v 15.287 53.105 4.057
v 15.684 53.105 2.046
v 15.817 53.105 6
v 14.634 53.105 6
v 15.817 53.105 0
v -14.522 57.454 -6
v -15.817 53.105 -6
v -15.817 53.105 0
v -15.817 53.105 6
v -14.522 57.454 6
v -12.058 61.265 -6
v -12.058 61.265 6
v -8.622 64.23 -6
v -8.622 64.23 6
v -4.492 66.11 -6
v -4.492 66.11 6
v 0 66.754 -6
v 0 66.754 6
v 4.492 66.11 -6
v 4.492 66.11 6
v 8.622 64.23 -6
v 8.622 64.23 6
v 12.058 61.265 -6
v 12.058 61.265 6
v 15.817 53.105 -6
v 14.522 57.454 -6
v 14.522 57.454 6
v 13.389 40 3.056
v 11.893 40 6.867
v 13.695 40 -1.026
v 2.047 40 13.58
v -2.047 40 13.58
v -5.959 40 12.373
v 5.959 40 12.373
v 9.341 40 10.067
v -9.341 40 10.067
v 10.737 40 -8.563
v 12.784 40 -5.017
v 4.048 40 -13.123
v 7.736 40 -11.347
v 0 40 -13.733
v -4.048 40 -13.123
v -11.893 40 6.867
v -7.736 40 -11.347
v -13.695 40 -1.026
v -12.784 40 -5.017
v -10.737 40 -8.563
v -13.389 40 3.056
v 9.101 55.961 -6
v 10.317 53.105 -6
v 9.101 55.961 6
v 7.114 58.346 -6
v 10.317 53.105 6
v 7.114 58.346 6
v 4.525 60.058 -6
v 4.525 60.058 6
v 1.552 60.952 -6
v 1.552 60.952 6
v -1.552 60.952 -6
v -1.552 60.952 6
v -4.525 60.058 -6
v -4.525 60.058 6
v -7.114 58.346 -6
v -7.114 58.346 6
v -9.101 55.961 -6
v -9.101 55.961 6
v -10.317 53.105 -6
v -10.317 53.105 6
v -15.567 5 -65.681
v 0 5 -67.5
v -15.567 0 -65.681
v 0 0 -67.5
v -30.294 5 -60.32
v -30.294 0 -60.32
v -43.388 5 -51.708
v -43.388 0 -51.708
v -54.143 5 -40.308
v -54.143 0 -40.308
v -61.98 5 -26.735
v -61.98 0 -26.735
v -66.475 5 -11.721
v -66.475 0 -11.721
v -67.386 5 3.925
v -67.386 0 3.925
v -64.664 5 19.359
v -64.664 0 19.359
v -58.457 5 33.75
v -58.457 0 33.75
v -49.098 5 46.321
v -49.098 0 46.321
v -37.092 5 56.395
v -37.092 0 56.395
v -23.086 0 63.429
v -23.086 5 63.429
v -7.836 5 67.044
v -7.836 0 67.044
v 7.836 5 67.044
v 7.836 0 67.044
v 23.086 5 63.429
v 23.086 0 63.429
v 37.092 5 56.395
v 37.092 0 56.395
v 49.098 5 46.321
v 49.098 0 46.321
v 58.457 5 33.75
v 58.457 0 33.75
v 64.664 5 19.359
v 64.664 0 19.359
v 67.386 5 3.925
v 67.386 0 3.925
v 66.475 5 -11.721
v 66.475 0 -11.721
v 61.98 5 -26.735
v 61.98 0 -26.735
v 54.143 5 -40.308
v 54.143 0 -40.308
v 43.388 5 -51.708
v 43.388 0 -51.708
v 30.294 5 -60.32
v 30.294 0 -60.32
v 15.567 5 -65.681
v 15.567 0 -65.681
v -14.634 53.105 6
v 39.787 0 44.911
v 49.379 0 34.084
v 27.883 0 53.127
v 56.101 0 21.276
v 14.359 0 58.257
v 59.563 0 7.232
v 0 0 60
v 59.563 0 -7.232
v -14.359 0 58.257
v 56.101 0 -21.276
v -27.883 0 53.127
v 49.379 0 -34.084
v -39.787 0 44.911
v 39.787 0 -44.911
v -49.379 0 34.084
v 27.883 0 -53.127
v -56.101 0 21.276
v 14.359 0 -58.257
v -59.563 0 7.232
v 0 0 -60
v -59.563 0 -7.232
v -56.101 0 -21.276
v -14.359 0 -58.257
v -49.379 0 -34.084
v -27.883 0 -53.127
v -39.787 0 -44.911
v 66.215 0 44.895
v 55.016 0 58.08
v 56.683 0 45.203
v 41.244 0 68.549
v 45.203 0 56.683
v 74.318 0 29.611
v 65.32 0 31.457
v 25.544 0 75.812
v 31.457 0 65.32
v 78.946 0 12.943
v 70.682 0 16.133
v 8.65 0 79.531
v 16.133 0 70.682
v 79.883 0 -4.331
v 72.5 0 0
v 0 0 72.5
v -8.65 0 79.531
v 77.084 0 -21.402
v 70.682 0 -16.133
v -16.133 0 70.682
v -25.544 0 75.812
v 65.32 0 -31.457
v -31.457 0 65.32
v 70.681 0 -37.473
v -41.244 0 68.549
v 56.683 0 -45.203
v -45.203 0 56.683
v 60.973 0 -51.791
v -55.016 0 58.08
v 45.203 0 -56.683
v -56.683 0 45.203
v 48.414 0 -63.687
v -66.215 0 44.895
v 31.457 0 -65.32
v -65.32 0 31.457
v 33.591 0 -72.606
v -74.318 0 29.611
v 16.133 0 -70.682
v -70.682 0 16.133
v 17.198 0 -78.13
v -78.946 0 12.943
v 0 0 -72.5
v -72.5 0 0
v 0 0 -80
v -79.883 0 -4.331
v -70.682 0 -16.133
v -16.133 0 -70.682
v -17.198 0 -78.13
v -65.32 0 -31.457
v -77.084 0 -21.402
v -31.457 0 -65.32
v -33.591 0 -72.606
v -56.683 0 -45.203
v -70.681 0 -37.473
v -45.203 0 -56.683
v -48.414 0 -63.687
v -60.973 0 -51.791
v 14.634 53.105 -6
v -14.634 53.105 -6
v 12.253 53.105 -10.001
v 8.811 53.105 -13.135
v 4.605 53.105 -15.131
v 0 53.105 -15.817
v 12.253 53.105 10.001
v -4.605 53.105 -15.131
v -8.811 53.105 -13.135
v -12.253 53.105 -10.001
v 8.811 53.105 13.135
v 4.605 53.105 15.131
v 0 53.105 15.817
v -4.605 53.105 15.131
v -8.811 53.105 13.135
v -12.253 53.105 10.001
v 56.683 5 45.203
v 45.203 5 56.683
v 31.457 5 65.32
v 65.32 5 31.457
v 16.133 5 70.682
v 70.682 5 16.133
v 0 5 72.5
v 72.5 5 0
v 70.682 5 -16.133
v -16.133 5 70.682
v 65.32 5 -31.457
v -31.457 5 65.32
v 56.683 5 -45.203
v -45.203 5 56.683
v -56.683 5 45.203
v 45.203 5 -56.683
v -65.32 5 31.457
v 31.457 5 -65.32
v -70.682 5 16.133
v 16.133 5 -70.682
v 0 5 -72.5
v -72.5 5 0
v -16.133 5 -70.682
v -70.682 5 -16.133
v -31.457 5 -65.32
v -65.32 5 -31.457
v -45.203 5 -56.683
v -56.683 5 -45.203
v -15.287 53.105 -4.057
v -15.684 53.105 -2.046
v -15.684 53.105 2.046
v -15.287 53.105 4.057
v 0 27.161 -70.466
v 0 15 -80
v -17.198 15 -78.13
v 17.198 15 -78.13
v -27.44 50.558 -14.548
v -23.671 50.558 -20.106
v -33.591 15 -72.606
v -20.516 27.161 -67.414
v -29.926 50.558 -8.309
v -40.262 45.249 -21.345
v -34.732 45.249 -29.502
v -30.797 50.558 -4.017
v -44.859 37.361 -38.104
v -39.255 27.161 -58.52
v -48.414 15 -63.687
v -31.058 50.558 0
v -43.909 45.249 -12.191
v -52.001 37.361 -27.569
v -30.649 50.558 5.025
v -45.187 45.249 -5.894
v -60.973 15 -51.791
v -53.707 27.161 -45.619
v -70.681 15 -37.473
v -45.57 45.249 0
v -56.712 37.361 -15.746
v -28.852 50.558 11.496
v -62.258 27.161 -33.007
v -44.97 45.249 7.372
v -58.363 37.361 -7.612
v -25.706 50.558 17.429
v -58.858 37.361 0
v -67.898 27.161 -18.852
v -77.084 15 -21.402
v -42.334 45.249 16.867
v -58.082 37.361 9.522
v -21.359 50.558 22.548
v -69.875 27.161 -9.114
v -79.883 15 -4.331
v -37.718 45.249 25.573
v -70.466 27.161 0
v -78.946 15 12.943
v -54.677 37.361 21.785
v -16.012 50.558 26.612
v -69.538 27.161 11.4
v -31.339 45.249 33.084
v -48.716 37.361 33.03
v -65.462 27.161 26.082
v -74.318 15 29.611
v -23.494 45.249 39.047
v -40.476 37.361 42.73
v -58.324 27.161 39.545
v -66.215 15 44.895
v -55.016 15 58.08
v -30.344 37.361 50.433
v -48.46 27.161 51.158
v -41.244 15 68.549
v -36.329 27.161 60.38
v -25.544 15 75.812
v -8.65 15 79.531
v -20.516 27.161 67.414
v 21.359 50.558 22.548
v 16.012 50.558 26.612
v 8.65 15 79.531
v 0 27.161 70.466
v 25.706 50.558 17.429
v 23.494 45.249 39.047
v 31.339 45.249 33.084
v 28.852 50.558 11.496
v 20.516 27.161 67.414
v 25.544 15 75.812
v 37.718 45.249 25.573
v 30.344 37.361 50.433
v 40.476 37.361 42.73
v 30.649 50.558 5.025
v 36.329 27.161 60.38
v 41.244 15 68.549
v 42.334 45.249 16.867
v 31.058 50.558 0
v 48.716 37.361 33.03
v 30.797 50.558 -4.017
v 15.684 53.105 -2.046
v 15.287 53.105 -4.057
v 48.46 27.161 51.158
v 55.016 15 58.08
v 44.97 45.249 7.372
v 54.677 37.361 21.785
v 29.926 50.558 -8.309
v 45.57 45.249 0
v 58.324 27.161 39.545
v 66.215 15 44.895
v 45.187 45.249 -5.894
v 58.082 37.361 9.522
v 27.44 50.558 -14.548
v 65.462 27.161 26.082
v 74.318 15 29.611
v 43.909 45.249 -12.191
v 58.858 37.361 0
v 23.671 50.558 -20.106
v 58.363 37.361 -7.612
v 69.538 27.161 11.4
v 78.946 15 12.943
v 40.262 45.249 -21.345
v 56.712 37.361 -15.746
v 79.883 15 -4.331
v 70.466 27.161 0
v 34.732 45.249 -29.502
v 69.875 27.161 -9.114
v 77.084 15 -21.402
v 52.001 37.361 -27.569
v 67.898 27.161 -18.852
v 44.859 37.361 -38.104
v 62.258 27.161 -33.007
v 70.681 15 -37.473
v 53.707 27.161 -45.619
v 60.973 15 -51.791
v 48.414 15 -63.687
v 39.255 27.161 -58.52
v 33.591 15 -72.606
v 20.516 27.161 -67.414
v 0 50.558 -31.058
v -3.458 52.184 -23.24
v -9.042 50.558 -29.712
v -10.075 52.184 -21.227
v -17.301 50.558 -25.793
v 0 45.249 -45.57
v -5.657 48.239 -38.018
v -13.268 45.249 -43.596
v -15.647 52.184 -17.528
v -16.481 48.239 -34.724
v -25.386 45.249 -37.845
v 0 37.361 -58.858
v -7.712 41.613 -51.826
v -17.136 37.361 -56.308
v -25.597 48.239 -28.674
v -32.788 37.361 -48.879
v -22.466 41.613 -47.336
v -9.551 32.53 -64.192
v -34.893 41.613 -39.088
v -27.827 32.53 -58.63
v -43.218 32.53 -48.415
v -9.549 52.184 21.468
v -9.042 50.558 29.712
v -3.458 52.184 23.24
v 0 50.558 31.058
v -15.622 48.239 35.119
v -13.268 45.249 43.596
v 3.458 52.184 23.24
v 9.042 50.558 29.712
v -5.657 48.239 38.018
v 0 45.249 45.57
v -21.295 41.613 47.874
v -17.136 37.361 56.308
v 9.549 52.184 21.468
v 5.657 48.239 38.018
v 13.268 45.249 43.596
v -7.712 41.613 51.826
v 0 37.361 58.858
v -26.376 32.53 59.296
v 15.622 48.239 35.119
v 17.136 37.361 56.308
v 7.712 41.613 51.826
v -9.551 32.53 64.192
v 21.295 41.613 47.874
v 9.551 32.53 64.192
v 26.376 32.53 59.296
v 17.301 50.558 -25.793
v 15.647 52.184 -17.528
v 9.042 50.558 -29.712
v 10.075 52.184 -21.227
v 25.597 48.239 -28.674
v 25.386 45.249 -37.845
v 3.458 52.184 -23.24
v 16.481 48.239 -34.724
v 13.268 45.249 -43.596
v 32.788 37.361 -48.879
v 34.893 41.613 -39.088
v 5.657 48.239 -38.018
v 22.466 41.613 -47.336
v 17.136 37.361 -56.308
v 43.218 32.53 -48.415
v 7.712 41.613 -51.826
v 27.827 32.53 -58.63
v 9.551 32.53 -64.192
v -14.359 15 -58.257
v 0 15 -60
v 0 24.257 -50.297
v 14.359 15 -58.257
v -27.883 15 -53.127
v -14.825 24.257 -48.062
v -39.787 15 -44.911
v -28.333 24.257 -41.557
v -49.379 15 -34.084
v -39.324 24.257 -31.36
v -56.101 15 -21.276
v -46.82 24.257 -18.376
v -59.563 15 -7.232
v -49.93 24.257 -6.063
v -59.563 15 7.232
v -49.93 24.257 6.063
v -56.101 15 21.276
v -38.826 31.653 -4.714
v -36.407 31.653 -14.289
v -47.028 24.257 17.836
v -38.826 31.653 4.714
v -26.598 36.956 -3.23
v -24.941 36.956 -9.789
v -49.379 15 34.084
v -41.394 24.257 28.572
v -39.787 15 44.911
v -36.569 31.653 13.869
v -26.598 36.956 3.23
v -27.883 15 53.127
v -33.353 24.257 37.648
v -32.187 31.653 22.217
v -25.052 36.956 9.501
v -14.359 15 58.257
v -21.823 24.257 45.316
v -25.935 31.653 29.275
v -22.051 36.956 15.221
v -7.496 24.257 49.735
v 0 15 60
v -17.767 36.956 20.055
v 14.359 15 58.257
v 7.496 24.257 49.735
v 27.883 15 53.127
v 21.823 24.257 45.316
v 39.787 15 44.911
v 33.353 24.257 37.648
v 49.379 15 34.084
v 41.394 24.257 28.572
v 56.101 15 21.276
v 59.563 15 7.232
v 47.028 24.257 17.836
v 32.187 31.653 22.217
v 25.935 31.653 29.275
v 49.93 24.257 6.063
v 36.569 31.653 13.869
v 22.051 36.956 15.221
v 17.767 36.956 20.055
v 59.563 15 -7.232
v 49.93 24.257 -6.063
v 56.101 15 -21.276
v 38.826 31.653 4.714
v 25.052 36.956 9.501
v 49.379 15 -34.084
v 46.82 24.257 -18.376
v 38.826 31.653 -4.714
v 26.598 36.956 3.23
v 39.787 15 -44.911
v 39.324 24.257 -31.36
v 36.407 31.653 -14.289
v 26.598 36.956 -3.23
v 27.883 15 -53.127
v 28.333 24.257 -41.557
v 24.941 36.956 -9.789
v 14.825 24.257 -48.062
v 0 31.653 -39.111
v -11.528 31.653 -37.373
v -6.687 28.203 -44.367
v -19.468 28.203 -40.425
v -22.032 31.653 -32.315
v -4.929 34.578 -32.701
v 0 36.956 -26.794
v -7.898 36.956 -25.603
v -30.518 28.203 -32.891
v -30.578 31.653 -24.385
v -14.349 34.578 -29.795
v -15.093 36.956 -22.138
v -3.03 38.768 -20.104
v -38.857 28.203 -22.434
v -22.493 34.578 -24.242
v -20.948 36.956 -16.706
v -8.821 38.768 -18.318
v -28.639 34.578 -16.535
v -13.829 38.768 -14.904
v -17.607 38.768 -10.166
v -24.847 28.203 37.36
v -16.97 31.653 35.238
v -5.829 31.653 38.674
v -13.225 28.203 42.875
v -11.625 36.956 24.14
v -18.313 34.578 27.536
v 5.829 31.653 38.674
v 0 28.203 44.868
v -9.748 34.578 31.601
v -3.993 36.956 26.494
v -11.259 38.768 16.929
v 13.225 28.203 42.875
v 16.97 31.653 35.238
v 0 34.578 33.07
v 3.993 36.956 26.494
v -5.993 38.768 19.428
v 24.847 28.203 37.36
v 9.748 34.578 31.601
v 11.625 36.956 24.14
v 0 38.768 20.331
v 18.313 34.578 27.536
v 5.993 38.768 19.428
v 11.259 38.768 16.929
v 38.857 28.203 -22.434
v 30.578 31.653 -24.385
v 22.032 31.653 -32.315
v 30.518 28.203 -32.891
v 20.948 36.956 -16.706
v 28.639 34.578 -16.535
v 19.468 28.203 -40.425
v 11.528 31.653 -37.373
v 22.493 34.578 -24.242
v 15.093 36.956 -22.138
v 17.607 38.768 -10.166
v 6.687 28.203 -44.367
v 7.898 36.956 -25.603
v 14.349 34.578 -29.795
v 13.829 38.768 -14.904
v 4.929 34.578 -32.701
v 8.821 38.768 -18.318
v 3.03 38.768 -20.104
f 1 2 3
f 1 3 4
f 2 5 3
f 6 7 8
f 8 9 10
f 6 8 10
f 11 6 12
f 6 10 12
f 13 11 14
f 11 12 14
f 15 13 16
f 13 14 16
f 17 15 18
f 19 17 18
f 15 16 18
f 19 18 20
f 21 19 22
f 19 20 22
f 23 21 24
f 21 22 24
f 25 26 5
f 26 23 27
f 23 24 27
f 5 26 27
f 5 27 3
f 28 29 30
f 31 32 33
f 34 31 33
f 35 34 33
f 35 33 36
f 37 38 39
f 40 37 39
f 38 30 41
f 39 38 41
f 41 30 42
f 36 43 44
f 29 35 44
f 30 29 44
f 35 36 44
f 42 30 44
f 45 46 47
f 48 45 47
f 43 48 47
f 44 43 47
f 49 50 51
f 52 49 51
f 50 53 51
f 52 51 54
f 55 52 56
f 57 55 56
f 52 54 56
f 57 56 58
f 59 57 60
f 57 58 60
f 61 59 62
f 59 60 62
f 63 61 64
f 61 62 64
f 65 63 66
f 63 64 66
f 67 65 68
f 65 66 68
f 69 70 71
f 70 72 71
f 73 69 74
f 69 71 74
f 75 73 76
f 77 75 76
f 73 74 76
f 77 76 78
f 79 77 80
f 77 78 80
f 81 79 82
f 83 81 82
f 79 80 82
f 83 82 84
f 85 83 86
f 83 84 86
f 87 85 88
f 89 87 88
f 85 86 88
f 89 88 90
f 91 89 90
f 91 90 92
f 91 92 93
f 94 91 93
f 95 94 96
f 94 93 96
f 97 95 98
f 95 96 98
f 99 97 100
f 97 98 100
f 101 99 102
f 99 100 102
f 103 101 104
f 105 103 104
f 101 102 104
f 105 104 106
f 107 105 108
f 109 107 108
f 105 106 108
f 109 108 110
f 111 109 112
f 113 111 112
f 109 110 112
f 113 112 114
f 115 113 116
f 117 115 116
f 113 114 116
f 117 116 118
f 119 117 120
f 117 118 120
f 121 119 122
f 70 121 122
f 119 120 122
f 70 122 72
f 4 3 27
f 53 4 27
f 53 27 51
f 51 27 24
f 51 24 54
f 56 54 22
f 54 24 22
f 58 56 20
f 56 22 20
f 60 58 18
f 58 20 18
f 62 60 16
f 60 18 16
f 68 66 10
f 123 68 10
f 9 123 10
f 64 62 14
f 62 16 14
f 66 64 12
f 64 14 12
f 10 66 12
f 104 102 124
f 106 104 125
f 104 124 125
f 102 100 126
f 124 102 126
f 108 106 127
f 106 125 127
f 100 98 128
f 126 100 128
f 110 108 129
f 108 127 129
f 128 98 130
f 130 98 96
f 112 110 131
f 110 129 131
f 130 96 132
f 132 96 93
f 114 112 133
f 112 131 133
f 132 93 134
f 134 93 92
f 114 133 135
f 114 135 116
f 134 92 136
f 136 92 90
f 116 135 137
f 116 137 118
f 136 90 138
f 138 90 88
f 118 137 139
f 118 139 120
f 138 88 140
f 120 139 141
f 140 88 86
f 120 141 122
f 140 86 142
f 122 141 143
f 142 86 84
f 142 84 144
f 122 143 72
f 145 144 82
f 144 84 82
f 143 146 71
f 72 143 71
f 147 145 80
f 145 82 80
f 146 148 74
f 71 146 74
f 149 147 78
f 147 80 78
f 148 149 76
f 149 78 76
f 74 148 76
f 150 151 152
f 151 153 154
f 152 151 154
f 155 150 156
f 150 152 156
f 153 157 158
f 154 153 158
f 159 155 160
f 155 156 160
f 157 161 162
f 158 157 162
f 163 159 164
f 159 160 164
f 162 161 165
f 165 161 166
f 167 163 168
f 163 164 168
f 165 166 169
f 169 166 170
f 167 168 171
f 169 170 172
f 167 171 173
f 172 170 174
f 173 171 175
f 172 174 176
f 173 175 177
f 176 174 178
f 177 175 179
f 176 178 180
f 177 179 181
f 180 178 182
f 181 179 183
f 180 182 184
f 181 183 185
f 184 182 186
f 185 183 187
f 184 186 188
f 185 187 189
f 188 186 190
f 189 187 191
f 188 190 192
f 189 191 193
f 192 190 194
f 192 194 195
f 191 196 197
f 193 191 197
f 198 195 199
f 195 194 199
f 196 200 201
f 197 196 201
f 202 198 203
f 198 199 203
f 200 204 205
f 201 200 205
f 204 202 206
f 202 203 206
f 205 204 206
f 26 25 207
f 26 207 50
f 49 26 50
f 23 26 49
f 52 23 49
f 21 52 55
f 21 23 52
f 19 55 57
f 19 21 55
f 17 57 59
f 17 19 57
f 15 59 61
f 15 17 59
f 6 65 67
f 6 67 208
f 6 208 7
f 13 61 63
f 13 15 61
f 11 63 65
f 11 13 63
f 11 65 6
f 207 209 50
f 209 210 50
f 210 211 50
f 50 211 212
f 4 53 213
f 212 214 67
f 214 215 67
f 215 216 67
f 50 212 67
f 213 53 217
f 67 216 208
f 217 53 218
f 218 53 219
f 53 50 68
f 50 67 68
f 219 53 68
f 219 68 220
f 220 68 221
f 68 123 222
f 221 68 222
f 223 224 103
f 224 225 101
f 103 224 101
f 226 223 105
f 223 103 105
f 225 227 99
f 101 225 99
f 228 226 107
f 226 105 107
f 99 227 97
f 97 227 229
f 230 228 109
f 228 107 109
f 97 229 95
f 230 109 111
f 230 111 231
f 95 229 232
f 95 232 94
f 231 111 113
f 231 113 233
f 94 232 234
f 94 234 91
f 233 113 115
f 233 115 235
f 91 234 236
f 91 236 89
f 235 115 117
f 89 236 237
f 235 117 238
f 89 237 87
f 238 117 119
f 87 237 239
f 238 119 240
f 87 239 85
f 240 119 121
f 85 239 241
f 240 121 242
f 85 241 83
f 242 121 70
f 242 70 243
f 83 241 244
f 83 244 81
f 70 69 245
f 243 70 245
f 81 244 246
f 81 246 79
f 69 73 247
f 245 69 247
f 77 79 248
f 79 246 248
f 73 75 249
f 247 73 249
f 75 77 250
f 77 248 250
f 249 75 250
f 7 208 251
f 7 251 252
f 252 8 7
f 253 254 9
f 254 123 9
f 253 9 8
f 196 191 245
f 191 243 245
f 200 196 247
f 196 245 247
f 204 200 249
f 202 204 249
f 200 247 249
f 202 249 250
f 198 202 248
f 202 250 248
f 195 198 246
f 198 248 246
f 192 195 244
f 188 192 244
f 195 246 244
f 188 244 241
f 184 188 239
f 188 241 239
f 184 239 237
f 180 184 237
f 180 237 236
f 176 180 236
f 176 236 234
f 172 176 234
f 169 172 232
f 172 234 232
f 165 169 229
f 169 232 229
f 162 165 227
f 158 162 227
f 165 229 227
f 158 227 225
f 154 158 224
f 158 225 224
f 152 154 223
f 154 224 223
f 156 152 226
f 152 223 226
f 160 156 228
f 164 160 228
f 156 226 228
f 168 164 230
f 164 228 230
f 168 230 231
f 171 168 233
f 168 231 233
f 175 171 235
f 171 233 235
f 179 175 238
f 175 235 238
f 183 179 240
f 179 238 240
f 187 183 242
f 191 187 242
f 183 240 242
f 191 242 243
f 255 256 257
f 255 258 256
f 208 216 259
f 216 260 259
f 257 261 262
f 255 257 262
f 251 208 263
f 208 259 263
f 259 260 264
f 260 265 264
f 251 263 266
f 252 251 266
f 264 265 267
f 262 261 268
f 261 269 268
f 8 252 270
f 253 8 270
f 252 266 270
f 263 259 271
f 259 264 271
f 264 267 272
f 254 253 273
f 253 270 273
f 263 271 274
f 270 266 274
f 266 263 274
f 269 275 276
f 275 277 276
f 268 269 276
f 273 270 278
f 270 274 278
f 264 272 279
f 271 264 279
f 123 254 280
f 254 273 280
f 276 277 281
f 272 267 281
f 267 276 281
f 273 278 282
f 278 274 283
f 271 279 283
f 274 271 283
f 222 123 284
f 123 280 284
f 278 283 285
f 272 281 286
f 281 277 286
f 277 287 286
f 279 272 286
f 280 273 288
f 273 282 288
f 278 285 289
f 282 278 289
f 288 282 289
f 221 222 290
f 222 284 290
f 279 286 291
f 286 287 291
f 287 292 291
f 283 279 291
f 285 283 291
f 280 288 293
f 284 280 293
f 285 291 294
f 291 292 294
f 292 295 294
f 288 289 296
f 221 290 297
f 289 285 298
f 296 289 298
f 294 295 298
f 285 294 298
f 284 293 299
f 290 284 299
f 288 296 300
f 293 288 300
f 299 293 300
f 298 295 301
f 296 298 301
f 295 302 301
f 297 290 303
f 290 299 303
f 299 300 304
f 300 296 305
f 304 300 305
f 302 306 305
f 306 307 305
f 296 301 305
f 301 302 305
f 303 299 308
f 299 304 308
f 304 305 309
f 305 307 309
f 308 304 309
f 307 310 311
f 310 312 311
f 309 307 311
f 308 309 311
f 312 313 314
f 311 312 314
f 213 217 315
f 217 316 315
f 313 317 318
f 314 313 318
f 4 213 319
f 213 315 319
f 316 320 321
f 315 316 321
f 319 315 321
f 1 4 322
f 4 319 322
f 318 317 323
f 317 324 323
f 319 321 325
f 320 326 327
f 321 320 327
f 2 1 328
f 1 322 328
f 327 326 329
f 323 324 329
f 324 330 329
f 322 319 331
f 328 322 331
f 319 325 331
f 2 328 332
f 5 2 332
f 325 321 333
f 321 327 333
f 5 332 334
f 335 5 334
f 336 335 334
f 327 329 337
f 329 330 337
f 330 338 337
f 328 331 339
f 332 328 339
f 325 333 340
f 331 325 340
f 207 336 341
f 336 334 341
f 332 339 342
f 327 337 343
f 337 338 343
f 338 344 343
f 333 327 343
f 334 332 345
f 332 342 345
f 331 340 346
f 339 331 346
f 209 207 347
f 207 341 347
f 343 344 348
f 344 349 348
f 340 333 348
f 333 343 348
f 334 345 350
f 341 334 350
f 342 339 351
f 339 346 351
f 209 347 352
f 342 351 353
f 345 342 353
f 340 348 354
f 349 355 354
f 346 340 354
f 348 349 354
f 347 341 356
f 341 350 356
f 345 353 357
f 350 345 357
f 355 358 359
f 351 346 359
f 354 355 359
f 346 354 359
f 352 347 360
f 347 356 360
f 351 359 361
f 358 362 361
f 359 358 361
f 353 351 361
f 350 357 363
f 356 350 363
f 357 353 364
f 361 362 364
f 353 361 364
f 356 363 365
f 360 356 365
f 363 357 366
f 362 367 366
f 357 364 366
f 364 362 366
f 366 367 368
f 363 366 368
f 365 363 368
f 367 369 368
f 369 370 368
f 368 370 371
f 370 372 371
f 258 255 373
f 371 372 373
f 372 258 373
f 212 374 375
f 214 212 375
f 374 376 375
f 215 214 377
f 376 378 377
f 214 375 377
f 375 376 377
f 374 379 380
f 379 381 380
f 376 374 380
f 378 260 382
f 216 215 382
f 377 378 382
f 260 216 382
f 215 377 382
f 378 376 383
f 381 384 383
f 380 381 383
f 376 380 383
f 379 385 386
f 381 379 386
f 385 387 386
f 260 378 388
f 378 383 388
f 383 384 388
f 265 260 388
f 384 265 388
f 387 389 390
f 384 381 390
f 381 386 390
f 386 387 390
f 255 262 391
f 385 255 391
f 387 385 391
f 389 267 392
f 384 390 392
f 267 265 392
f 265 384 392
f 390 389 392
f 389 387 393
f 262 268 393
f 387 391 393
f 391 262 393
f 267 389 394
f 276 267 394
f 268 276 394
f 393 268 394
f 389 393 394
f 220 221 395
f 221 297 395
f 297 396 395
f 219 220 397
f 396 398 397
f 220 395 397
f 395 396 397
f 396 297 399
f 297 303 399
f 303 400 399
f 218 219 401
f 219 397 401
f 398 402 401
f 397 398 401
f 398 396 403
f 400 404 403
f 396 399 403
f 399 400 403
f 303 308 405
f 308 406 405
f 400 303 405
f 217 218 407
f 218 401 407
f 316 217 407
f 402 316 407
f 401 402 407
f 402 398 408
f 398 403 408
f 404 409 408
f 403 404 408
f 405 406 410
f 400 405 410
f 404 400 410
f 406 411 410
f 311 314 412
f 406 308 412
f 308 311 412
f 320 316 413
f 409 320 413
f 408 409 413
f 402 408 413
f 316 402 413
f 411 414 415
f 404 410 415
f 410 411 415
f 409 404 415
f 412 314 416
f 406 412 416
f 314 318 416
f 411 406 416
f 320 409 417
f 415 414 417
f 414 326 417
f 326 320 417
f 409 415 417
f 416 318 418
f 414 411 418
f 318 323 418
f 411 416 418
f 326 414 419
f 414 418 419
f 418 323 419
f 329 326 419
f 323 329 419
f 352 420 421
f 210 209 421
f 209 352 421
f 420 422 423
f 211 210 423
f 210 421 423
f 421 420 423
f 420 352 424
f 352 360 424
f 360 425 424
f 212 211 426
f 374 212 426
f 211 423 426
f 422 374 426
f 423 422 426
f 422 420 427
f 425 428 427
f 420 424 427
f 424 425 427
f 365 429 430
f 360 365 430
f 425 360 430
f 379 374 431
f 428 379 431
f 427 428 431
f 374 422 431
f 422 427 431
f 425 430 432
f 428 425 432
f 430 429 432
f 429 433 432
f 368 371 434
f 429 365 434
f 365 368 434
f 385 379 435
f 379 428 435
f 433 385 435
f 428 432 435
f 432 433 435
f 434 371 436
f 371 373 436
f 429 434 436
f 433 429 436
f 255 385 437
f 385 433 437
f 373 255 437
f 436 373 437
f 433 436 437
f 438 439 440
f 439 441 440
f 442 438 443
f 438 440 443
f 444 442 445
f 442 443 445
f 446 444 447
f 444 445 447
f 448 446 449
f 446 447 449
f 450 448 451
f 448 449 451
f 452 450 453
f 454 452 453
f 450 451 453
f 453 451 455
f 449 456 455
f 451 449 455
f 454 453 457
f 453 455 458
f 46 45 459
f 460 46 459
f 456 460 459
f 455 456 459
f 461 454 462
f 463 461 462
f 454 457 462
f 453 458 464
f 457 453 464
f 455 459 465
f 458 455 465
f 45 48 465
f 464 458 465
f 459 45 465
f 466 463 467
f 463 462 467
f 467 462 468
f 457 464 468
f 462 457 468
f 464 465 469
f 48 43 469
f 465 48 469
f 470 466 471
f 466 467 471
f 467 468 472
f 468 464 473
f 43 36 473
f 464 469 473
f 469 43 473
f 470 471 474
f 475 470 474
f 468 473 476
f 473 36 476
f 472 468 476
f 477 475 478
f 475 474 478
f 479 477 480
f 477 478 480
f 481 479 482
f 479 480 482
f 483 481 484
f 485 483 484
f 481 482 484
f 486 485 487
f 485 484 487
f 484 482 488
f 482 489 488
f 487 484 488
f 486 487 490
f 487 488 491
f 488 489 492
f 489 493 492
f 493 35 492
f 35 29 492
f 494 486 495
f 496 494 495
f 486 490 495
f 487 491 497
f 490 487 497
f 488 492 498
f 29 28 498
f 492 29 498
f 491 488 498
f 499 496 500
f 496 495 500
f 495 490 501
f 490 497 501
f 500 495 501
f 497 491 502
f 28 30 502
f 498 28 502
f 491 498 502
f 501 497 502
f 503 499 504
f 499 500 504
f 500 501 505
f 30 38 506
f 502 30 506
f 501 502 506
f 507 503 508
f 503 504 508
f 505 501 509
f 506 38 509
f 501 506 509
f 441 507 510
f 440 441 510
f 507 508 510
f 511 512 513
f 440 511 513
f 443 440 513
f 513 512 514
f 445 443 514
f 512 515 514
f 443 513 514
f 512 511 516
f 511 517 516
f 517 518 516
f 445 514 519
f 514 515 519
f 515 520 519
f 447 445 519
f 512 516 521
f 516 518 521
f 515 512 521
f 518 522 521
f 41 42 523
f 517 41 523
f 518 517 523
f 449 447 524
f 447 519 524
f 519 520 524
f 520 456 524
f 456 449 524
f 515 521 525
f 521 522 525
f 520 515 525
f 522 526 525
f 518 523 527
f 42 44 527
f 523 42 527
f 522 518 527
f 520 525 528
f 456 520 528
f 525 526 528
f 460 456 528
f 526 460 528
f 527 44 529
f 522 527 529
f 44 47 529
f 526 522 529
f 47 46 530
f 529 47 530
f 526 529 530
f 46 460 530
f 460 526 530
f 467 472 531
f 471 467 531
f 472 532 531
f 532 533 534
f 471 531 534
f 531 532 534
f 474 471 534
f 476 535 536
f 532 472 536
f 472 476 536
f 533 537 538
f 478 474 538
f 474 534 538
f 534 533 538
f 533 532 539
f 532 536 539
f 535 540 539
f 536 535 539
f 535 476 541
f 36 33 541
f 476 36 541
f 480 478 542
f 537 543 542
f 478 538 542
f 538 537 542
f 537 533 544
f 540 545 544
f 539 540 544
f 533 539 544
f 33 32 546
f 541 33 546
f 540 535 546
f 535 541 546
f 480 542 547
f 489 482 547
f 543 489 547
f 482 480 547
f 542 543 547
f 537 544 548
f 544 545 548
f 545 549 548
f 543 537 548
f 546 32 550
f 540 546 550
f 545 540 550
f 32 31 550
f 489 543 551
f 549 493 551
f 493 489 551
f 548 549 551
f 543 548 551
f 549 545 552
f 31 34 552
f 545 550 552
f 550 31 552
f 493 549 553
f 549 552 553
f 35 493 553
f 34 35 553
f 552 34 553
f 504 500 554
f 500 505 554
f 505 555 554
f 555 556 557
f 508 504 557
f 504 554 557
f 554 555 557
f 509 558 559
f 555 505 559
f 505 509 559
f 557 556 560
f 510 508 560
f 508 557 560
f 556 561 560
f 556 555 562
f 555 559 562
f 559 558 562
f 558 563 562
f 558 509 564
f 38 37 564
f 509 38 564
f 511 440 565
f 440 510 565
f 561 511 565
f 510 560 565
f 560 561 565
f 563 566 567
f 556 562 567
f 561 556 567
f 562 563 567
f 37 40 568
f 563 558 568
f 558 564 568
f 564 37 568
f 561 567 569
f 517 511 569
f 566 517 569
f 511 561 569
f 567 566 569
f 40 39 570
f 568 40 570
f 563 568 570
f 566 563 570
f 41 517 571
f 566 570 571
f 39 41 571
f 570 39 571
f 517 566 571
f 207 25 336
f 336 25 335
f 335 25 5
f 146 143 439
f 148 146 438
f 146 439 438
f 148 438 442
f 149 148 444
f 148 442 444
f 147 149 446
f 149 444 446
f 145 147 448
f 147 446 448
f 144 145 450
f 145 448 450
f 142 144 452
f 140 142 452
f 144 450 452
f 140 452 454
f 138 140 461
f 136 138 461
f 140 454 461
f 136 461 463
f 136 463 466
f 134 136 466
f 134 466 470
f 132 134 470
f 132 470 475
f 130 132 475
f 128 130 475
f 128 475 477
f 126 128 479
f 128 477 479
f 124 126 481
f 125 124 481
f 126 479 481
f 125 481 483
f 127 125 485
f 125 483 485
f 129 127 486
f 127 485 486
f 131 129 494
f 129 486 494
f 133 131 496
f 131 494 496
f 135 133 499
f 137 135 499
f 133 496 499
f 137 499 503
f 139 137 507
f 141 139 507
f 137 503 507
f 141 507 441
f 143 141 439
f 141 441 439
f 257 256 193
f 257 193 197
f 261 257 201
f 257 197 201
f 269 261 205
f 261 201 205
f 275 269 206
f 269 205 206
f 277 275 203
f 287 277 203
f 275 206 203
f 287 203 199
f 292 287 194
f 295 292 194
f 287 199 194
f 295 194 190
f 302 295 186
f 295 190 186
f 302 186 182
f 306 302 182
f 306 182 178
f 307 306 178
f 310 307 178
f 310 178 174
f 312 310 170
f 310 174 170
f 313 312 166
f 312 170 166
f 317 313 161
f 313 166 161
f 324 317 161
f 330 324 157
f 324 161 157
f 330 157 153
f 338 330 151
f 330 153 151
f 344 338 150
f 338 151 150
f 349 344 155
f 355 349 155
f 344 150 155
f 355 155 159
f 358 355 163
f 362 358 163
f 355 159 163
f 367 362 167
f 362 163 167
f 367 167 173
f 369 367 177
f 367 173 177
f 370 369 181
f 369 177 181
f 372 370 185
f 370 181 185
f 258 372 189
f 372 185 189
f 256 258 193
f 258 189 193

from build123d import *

# Parameters (mm, degrees)
RESSALTO_EXTRUS_O1_DEPTH = 6


with BuildPart() as part:
    # Esboço1 → Revolução1 (revolve)
    with BuildSketch(Plane.XY, mode=Mode.PRIVATE) as revolu_o1_sk:
        with BuildLine():
            Line((-80, 0), (-72.5, 0))
            Line((-72.5, 0), (-72.5, 5))
            Line((-72.5, 5), (-67.5, 5))
            Line((-67.5, 5), (-67.5, 0))
            Line((-67.5, 0), (-60, 0))
            Line((-60, 0), (-60, 15))
            ThreePointArc((-60, 15), (-39.11072253, 31.653079881), (-13.733254033, 40))
            Line((-13.733254033, 40), (0, 40))
            Line((0, 40), (0, 53.104839013))
            Line((0, 53.104839013), (-15.816514793, 53.104839013))
            ThreePointArc((-15.816514793, 53.104839013), (-52.396597301, 41.612543242), (-80, 15))
            Line((-80, 15), (-80, 0))
        make_face()
    revolve(revolu_o1_sk.sketch.rotate(Axis((0, 0, 0), (0, 1, 0)), 270), axis=Axis((0, 0, 0), (0, 1, 0)))

    # Esboço2 → Ressalto-extrusão1 (add, symmetric)
    with BuildSketch(Plane.XY):
        with BuildLine():
            Line((15.816514793, 53.104839013), (10.316514793, 53.104839013))
            ThreePointArc((10.316514793, 53.104839013), (0, 61.065494668), (-10.316514793, 53.104839013))
            Line((-10.316514793, 53.104839013), (-15.816514793, 53.104839013))
            ThreePointArc((-15.816514793, 53.104839013), (0, 66.754458801), (15.816514793, 53.104839013))
        make_face()
    extrude(amount=RESSALTO_EXTRUS_O1_DEPTH, both=True)


solid = part.part
